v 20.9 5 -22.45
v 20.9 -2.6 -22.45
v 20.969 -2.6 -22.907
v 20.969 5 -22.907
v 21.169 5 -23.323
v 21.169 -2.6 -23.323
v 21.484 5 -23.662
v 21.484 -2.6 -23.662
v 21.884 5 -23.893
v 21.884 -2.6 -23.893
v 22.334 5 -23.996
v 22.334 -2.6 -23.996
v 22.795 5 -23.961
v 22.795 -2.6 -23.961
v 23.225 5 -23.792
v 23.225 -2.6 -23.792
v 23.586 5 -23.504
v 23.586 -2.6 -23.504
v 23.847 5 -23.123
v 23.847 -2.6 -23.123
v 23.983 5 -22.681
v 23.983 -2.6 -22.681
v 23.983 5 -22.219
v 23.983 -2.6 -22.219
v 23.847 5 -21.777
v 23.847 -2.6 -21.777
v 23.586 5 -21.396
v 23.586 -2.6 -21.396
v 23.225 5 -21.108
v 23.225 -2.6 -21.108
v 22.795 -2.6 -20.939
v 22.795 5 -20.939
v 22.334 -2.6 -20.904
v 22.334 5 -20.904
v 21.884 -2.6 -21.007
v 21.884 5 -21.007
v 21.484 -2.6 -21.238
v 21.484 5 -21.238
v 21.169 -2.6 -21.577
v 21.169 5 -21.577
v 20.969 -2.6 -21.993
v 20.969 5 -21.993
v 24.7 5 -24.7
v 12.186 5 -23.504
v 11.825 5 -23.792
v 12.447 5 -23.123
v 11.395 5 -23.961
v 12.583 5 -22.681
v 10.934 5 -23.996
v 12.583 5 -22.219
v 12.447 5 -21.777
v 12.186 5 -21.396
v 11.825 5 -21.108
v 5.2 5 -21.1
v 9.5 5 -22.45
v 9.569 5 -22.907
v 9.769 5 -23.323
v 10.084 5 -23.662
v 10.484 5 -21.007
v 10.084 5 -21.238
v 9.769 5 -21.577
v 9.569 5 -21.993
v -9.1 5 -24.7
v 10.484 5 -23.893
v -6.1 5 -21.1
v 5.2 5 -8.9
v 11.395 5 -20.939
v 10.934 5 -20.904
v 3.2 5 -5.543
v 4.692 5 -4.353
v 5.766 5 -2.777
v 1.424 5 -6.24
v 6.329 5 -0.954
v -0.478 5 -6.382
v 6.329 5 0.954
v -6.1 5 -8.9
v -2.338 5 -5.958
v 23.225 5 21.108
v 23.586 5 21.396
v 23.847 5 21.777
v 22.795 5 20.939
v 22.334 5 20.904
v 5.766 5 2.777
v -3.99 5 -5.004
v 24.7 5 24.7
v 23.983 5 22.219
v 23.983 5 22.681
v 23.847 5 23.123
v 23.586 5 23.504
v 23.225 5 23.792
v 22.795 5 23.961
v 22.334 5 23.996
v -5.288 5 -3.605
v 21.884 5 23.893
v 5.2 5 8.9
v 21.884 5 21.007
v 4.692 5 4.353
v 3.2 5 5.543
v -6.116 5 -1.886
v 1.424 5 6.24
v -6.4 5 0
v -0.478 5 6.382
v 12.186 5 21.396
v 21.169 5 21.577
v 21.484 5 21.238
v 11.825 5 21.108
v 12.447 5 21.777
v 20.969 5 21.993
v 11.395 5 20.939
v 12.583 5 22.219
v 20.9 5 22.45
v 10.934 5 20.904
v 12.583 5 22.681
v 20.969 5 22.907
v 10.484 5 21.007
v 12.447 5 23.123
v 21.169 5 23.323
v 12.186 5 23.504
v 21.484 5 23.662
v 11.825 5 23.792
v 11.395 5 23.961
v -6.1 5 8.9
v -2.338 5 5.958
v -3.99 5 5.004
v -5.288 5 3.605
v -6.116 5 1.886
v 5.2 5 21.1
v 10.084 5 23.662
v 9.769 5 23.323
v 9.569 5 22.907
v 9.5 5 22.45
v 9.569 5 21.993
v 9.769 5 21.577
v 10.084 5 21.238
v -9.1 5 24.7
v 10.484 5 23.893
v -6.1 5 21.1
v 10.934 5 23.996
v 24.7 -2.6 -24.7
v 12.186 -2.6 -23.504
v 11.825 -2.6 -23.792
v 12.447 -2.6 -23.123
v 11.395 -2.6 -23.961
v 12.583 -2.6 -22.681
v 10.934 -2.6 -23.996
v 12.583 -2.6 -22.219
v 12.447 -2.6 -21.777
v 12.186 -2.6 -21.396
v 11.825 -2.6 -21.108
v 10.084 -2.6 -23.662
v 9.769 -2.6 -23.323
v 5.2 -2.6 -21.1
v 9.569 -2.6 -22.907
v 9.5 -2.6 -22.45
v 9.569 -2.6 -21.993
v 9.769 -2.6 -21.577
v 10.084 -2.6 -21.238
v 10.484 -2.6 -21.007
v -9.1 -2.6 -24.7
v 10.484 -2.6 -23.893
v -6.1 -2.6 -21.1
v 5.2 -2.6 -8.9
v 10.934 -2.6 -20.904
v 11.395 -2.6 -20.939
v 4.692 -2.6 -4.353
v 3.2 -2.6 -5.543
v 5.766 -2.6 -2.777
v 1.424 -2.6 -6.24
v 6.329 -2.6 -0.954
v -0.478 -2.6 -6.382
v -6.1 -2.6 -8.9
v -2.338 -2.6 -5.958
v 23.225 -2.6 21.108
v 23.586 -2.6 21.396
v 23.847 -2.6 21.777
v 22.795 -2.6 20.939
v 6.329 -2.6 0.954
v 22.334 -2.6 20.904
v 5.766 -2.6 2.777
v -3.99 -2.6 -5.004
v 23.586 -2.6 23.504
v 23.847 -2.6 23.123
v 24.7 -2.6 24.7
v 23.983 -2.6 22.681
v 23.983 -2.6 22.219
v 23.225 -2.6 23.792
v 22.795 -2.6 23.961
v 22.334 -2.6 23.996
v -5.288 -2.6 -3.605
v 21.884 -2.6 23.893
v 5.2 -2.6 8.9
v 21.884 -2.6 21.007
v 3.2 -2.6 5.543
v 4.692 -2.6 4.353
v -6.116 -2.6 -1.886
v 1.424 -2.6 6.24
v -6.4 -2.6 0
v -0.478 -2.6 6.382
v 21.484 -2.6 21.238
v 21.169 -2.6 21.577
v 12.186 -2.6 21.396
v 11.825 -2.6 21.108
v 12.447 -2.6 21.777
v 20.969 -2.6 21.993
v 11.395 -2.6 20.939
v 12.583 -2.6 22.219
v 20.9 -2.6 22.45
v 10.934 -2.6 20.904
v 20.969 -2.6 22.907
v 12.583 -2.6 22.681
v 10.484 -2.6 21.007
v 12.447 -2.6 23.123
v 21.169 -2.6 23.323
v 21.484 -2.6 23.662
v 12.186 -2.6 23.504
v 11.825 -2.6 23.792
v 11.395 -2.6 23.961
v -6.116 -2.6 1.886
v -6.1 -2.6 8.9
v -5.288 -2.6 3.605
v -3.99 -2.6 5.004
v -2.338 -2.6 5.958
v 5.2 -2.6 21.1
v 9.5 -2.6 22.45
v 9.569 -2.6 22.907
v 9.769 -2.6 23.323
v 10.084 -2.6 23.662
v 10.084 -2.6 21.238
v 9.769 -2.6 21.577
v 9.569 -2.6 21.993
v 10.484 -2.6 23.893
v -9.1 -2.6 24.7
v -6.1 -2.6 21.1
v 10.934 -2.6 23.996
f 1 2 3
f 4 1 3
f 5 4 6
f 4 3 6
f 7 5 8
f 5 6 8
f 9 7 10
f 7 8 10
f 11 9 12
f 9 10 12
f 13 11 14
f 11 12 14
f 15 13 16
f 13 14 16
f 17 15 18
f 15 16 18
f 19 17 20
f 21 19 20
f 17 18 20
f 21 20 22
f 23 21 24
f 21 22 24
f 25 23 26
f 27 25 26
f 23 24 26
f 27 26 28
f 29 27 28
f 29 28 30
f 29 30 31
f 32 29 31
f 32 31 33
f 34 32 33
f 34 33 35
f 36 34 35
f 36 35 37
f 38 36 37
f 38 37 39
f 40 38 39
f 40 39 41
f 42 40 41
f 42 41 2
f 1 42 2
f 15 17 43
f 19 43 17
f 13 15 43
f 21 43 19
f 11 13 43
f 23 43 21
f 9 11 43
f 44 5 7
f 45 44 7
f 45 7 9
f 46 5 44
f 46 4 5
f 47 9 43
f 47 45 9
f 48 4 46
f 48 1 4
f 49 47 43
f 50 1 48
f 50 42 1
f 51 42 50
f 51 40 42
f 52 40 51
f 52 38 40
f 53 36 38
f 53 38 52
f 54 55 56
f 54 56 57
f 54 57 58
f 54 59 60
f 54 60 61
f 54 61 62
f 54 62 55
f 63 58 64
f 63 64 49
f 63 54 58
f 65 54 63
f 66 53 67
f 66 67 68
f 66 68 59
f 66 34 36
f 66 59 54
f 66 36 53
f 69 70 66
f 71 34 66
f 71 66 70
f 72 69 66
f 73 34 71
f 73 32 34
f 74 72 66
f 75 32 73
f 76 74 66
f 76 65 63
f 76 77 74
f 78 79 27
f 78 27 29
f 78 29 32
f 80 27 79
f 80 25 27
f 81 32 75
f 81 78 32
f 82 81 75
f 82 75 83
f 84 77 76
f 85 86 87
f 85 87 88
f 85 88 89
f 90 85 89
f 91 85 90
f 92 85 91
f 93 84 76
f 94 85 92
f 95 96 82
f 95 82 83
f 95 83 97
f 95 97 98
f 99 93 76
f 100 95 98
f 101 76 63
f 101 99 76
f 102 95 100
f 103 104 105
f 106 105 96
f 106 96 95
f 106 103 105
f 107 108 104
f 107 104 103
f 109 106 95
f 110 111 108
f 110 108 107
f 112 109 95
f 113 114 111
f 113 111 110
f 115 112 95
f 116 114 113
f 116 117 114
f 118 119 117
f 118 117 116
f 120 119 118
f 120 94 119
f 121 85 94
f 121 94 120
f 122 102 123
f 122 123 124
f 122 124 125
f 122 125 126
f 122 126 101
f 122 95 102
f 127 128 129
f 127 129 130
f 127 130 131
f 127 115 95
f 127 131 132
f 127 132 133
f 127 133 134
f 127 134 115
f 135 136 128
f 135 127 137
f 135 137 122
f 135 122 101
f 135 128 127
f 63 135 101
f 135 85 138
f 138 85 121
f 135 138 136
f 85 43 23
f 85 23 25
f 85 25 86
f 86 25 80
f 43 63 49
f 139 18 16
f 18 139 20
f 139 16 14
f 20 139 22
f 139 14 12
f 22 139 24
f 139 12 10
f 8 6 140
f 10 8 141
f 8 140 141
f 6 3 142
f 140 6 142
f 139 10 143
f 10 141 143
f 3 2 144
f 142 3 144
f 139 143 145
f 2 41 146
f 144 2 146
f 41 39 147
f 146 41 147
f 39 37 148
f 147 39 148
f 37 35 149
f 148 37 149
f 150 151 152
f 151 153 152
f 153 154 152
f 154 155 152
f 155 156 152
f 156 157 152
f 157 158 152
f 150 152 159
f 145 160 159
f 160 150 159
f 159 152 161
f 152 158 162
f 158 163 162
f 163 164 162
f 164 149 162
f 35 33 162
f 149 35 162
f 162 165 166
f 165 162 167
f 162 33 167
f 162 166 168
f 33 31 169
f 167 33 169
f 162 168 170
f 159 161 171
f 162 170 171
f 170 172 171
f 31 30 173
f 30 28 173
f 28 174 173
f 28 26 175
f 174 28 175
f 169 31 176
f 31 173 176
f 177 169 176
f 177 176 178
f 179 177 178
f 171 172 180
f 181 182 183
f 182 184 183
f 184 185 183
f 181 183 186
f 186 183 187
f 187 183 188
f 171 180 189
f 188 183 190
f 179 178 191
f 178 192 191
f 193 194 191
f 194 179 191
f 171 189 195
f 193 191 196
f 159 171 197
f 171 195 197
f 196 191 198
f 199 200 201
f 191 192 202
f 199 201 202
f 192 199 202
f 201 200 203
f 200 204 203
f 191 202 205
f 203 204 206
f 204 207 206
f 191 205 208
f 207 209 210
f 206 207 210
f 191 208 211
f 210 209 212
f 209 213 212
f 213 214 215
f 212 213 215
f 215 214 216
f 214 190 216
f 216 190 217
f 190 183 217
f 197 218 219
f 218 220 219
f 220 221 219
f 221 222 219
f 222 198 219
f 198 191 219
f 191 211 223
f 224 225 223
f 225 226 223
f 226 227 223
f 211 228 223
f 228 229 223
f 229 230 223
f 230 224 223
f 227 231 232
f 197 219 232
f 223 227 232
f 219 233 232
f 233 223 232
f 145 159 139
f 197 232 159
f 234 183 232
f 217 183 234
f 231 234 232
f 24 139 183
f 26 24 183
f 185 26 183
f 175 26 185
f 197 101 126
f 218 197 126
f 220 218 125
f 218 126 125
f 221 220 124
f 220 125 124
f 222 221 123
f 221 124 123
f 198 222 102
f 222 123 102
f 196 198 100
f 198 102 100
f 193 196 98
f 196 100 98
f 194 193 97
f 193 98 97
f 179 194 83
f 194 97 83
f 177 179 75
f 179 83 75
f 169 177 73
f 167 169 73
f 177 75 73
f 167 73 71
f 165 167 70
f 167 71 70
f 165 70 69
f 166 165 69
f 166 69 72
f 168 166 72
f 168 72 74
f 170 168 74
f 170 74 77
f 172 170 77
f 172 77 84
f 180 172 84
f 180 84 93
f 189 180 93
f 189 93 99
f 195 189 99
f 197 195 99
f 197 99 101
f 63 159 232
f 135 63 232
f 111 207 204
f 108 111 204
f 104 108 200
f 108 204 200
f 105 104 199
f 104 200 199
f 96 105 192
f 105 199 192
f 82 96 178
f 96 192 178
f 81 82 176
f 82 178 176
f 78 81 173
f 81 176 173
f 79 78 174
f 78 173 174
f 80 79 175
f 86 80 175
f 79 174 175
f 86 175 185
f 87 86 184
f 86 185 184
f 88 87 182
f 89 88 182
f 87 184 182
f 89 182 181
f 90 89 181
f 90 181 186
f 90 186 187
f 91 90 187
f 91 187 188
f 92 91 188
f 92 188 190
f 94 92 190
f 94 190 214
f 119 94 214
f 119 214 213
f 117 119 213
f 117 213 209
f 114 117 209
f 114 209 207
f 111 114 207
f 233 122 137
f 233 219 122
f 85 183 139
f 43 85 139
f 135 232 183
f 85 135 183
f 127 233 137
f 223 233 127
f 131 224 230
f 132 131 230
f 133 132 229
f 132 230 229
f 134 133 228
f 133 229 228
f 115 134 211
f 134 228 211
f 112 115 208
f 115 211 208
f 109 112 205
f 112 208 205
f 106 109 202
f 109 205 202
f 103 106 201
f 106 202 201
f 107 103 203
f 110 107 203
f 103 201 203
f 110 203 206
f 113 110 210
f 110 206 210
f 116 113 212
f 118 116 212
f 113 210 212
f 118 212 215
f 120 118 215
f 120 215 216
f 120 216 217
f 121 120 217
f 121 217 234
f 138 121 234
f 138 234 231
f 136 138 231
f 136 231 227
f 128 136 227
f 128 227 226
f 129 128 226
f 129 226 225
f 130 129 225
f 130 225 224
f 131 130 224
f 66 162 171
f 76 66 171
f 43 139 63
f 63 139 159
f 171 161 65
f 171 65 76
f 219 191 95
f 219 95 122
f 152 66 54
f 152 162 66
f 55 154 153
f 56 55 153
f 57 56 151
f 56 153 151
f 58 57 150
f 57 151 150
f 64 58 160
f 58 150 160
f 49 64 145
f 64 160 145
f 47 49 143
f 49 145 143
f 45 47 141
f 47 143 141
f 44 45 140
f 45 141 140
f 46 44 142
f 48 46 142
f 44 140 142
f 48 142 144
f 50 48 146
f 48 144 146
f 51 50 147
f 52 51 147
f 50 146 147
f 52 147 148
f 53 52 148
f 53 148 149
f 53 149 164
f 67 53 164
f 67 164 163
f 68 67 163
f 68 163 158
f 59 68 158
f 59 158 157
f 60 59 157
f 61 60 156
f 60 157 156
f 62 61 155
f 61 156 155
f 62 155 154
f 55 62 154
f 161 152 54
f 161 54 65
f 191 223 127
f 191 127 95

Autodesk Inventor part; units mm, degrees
ref_plane "YZ Plane" through (0, 0, 0) normal (1, 0, 0) x (0, 1, 0)
ref_plane "XZ Plane" through (0, 0, 0) normal (0, 1, 0) x (-1, 0, 0)
ref_plane "XY Plane" through (0, 0, 0) normal (0, 0, 1) x (1, 0, 0)
sketch "Esboço1" plane through (0, 0, 0) normal (0, 1, 0) x (-1, 0, 0)
  circle A0 centre (0, 0) radius 2.1
  line L0 (0, 0) -> (0, 15)
  circle A1 centre (0, 15) radius 2
  line L1 (0, 0) -> (0, -15)
  circle A2 centre (0, -15) radius 2.1
  line L2 (0, 15) -> (-5.2, 15)
  line L3 (-5.2, 15) -> (-5.2, -15)
  line L4 (-5.2, -15) -> (0, -15)
  circle A3 centre (0, 0) radius 6.1
  circle A4 centre (0, 0) radius 24.7
  line L5 (0, 24.7) -> (24.7, 24.7)
  line L6 (24.7, 24.7) -> (24.7, 0)
  line L7 (24.7, 0) -> (0, 0)
  line L8 (0, 0) -> (0, 24.7)
  line L9 (24.7, 0) -> (0, 0)
  line L10 (0, 0) -> (0, -24.7)
  line L11 (0, -24.7) -> (24.7, -24.7)
  line L12 (24.7, -24.7) -> (24.7, 0)
  line L13 (0, -24.7) -> (-24.7, -24.7)
  line L14 (-24.7, -24.7) -> (-24.7, 0)
  line L15 (-24.7, 0) -> (0, 0)
  line L16 (0, 0) -> (0, -24.7)
  line L17 (0, 24.7) -> (-24.7, 24.7)
  line L18 (-24.7, 24.7) -> (-24.7, 0)
  line L19 (-24.7, 0) -> (0, 0)
  line L20 (0, 0) -> (0, 24.7)
  line L21 (-5.2, 15) -> (-5.2, 24.7)
  line L22 (-5.2, -15) -> (-5.2, -24.7)
  line L23 (-5.2, 24.7) -> (-24.7, 24.7)
  line L24 (-24.7, 24.7) -> (-24.7, -24.7)
  line L25 (-24.7, -24.7) -> (-5.2, -24.7)
  line L26 (-5.2, -24.7) -> (-5.2, 24.7)
  line L27 (0, -15) -> (0, -21.1)
  line L28 (0, -21.1) -> (-5.2, -21.1)
  line L29 (0, -15) -> (0, -8.9)
  line L30 (0, -8.9) -> (-5.2, -8.9)
  line L31 (0, -8.9) -> (0, -15)
  line L32 (0, 15) -> (0, 8.9)
  line L33 (0, 15) -> (0, 21.1)
  line L34 (0, 21.1) -> (-5.2, 21.1)
  line L35 (0, 8.9) -> (-5.2, 8.9)
  line L36 (6.1, 0) -> (6.1, -24.7)
  line L37 (6.1, 0) -> (6.1, 24.7)
  line L38 (-5.2, 21.1) -> (6.1, 21.1)
  line L39 (6.1, 21.1) -> (6.1, 24.7)
  line L40 (6.1, 24.7) -> (-5.2, 24.7)
  line L41 (-5.2, 24.7) -> (-5.2, 21.1)
  line L42 (-5.2, -21.1) -> (6.1, -21.1)
  line L43 (6.1, -21.1) -> (6.1, -24.7)
  line L44 (6.1, -24.7) -> (-5.2, -24.7)
  line L45 (-5.2, -24.7) -> (-5.2, -21.1)
  line L46 (6.1, 21.1) -> (0, 21.1)
  line L47 (0, 21.1) -> (0, 8.9)
  line L48 (0, 8.9) -> (6.1, 8.9)
  line L49 (6.1, 8.9) -> (6.1, 21.1)
  line L50 (0, -8.9) -> (6.1, -8.9)
  line L51 (6.1, -8.9) -> (6.1, -21.1)
  line L52 (6.1, -21.1) -> (0, -21.1)
  line L53 (0, -21.1) -> (0, -8.9)
  line L54 (6.1, -24.7) -> (9.1, -24.7)
  line L55 (9.1, -24.7) -> (9.1, 24.7)
  line L56 (9.1, 24.7) -> (6.1, 24.7)
  line L57 (6.1, 24.7) -> (6.1, -24.7)
  circle A5 centre (0, 0) radius 8.3
  circle A6 centre (0, 15) radius 8.3
  line L58 (-5.2, -8.9) -> (-24.7, -8.9)
  line L59 (-24.7, -8.9) -> (-24.7, -24.7)
  line L60 (-24.7, -24.7) -> (-5.2, -24.7)
  line L61 (-5.2, -24.7) -> (-5.2, -8.9)
  line L62 (-5.2, 8.9) -> (-24.7, 8.9)
  line L63 (-24.7, 8.9) -> (-24.7, 24.7)
  line L64 (-24.7, 24.7) -> (-5.2, 24.7)
  line L65 (-5.2, 24.7) -> (-5.2, 8.9)
  line L66 (-8.3, 0) -> (-8.3, -8.9)
  line L67 (-8.3, 0) -> (-8.3, 8.9)
  line L68 (-8.3, -8.9) -> (-8.8, -8.9)
  line L69 (-8.8, -8.9) -> (-8.8, 8.9)
  line L70 (-8.8, 8.9) -> (-8.3, 8.9)
  line L71 (-8.3, 8.9) -> (-8.3, -8.9)
  line L72 (-8.8, -8.9) -> (-24.7, -8.9)
  line L73 (-24.7, -8.9) -> (-24.7, -24.7)
  line L74 (-24.7, -24.7) -> (-8.8, -24.7)
  line L75 (-8.8, -24.7) -> (-8.8, -8.9)
  line L76 (-8.8, -8.9) -> (-24.7, -8.9)
  line L77 (-24.7, -8.9) -> (-24.7, 24.7)
  line L78 (-24.7, 24.7) -> (-8.8, 24.7)
  line L79 (-8.8, 24.7) -> (-8.8, -8.9)
  line L80 (9.1, -24.7) -> (6.1, -24.7)
  line L81 (6.1, -24.7) -> (6.1, -21.1)
  line L82 (6.1, -21.1) -> (9.1, -21.1)
  line L83 (9.1, -21.1) -> (9.1, -24.7)
  line L84 (6.1, 21.1) -> (9.1, 21.1)
  line L85 (9.1, 21.1) -> (9.1, 24.7)
  line L86 (9.1, 24.7) -> (6.1, 24.7)
  line L87 (6.1, 24.7) -> (6.1, 21.1)
  line L88 (9.1, 24.7) -> (9.1, 22.9)
  line L89 (-24.7, -24.7) -> (-21.7, -24.7)
  line L90 (-24.7, -21.1) -> (-24.7, -24.7)
  line L91 (-24.7, 24.7) -> (-21.7, 24.7)
  line L92 (-24.7, 21.1) -> (-24.7, 24.7)
  line L93 (-24.7, -24.7) -> (-20.2, -24.7)
  line L94 (-20.2, -24.7) -> (-20.2, -20.2)
  line L95 (-20.2, -20.2) -> (-24.7, -20.2)
  line L96 (-24.7, -20.2) -> (-24.7, -24.7)
  line L97 (-24.7, 24.7) -> (-20.2, 24.7)
  line L98 (-20.2, 24.7) -> (-20.2, 20.2)
  line L99 (-20.2, 20.2) -> (-24.7, 20.2)
  line L100 (-24.7, 20.2) -> (-24.7, 24.7)
  line L101 (-8.8, -24.7) -> (-13.3, -24.7)
  line L102 (-13.3, -24.7) -> (-13.3, -20.2)
  line L103 (-13.3, -20.2) -> (-8.8, -20.2)
  line L104 (-8.8, -20.2) -> (-8.8, -24.7)
  line L105 (-8.8, 24.7) -> (-13.3, 24.7)
  line L106 (-13.3, 24.7) -> (-13.3, 20.2)
  line L107 (-13.3, 20.2) -> (-8.8, 20.2)
  line L108 (-8.8, 20.2) -> (-8.8, 24.7)
  line L109 (-13.3, -22.45) -> (-8.8, -22.45)
  line L110 (-20.2, -22.45) -> (-24.7, -22.45)
  line L111 (-20.2, 22.45) -> (-24.7, 22.45)
  line L112 (-8.8, 22.45) -> (-13.3, 22.45)
  circle A7 centre (-11.05, -22.45) radius 1.55
  circle A8 centre (-22.45, -22.45) radius 1.55
  circle A9 centre (-11.05, 22.45) radius 1.55
  circle A10 centre (-22.45, 22.45) radius 1.55
  circle A11 centre (0, 0) radius 6.4
  point P0 (-5.2, -3.189)
  point P1 (-5.2, 3.189)
  point P2 (-5.2, 24.1464)
  point P3 (-5.2, -24.1464)
  point P4 (6.1, -21.1)
  point P5 (6.1, 21.1)
  dimension "d6" = 12.2
  dimension "d19" = 16.6
  dimension "d0" = 4.2
  dimension "d1" = 15
  dimension "d2" = 4
  dimension "d3" = 15
  dimension "d4" = 4.2
  dimension "d5" = 5.2
  dimension "d7" = 49.4
  dimension "d8" = 6.1
  dimension "d9" = 6.1
  dimension "d10" = 6.1
  dimension "d11" = 6.1
  dimension "d16" = 3
  dimension "d20" = 16.6
  dimension "d21" = 0.5
  dimension "d29" = 4.5
  dimension "d30" = 4.5
  dimension "d31" = 4.5
  dimension "d32" = 4.5
  dimension "d33" = 4.5
  dimension "d34" = 4.5
  dimension "d35" = 4.5
  dimension "d36" = 4.5
  dimension "d37" = 3.1
  dimension "d38" = 3.1
  dimension "d39" = 3.1
  dimension "d40" = 3.1
  dimension "d45" = 12.8
extrude "Extrusão1" add sketch "Esboço1" along normal blind 5 contours A3 L15 A11 L3 | L3 A11 L15 A3 | A11 L15 A5 L3 | L3 A5 L15 A11 | A5 L67 L62 A6 L3 | L3 L58 L66 A5 | L66 L58 L69 L15 | L15 L69 L62 L67 | A6 L62 L3 | L3 L22 A4 L75 L58 | L69 L58 A4 L15 | L15 A4 L62 L69 | L62 L79 A4 L21 A6 | L62 A6 L21 L3 | L75 L103 L102 A4 L58 | L62 A4 L106 L107 L79 | L75 L109 A7 A4 L102 L103 | L107 L106 A4 A9 L112 L79 | A4 A7 L109 L75 | L112 A9 A4 L79 | A4 L109 A7 | A4 L112 A9 | A7 L109 A4 | L112 A4 A9 picked at (-9.9489, -22.4881) picked at (-11.1489, 21.6171) picked at (-11.1489, -21.6171) picked at (-9.9489, 22.4881)
extrude "Extrusão2" add sketch "Esboço1" along normal blind 5 contours L36 A11 L1 A3 | A3 L0 A11 L37 | A3 L3 A11 L0 | L1 A11 L3 A3 | L36 A5 L1 A11 | A11 L0 A6 A5 L37 | A11 L3 A5 A6 L0 | L1 A5 L3 A11 | L36 L50 L1 A5 | A5 A6 L48 L37 | A6 A5 L0 | L0 A5 A6 | L1 L30 L3 A5 | A5 L0 L48 A6 | A5 A6 L3 L35 L0 | A5 L3 A6 | L36 A4 L10 L42 | L38 A6 L8 A4 L37 | L36 L11 A4 | L10 A4 L22 L28 | A4 L5 L37 | L38 L8 A6 | L13 L22 A4 | L18 L62 A4 | A4 L58 L14 | A6 L8 L34 L21 | L21 A4 L8 A6 | A4 L21 L17 | L22 L13 L75 A4 | L62 L18 L99 L98 L17 L106 A4 | A4 L102 L13 L94 L95 L14 L58 | A4 L79 L17 L21 | L75 L13 L102 L109 A7 A4 | L106 L112 A9 A4 | A4 A7 L109 L102 | L95 L94 L110 A8 L14 | L18 L111 A10 L98 L99 | A4 A9 L112 L106 L17 L79 | A7 L109 A4 | A9 L112 A4 | A4 L109 A7 | A4 L112 A9 | L13 L14 L110 A8 L94 | L18 L17 L98 L111 A10 | A8 L110 | L110 A8 | A10 L111 | L111 A10 picked at (-11.818, -22.5746) picked at (-11.7193, 22.131) picked at (-11.7193, -22.131) picked at (-11.818, 22.5746)
extrude "Extrusão3" add sketch "Esboço1" along normal blind 5 contours L37 A11 L7 | L7 A11 L36 | A11 L37 A5 L7 | L7 A5 L36 A11 | A5 L37 A6 L84 L55 L7 | L7 L55 L82 L36 A5 | L55 A4 L36 L82 | L84 L37 A4 L55 | L37 A6 | A4 L37 L5 L55 | L55 L11 L36 A4
extrude "Extrusão4" cut sketch "Esboço1" along normal through all contours A7 L109 A4 | A4 L109 A7 | A9 L112 A4 | A4 L112 A9 | A7 L109 A4 | A4 L109 A7 | L112 A4 A9 | A4 L112 A9 | A8 L110 | L110 A8 | A10 L111 | L111 A10
extrude "Extrusão5" add sketch "Esboço1" against normal blind 2.6 contours L36 A11 L1 A3 | L37 A11 L7 | L7 A11 L36 | A3 L0 A11 L37 | A3 L3 A11 L0 | L1 A11 L3 A3 | A11 L37 A5 L7 | L7 A5 L36 A11 | L36 A5 L1 A11 | A11 L0 A6 A5 L37 | A11 L3 A5 A6 L0 | A3 L15 A11 L3 | L1 A5 L3 A11 | L3 A11 L15 A3 | A5 L37 A6 L84 L55 L7 | L7 L55 L82 L36 A5 | L36 L50 L1 A5 | A5 A6 L48 L37 | A6 A5 L0 | L0 A5 A6 | A11 L15 A5 L3 | L1 L30 L3 A5 | L3 A5 L15 A11 | A5 L0 L48 A6 | A5 A6 L3 L35 L0 | A5 L3 A6 | A5 L67 L62 A6 L3 | L3 L58 L66 A5 | L55 A4 L36 L82 | L84 L37 A4 L55 | L36 A4 L10 L42 | L37 A6 | L66 L58 L69 L15 | L15 L69 L62 L67 | A6 L62 L3 | L3 L22 A4 L75 L58 | A4 L37 L5 L55 | L55 L11 L36 A4 | L38 A6 L8 A4 L37 | L36 L11 A4 | L10 A4 L22 L28 | L69 L58 A4 L15 | L15 A4 L62 L69 | L62 L79 A4 L21 A6 | L62 A6 L21 L3 | A4 L5 L37 | L38 L8 A6 | L13 L22 A4 | L18 L62 A4 | A4 L58 L14 | L75 L103 L102 A4 L58 | L62 A4 L106 L107 L79 | A6 L8 L34 L21 | L21 A4 L8 A6 | A4 L21 L17 | L22 L13 L75 A4 | L62 L18 L99 L98 L17 L106 A4 | A4 L102 L13 L94 L95 L14 L58 | L75 L109 A7 A4 L102 L103 | L107 L106 A4 A9 L112 L79 | A4 L79 L17 L21 | L75 L13 L102 L109 A7 A4 | A4 A7 L109 L75 | L106 L112 A9 A4 | A4 A7 L109 L102 | L95 L94 L110 A8 L14 | L18 L111 A10 L98 L99 | L112 A9 A4 L79 | A4 A9 L112 L106 L17 L79 | L13 L14 L110 A8 L94 | L18 L17 L98 L111 A10
extrude "Extrusão6" cut sketch "Esboço1" against normal blind 2.6 contours L7 L0 A0 | L7 A3 L1 A0 | A0 L0 A3 L7 | A0 L1 L7 | L0 L15 A0 | A0 L15 L3 A3 L0 | L1 A3 L3 L15 A0 | A0 L15 L1 | L36 A11 L1 A3 | L37 A11 L7 | L7 A11 L36 | A3 L0 A11 L37 | A3 L3 A11 L0 | L1 A11 L3 A3 | L15 A3 L3 | L3 A3 L15 | A3 L15 A11 L3 | L3 A11 L15 A3
extrude "Extrusão7" cut sketch "Esboço1" along normal through all contours L7 L0 A0 | L7 A3 L1 A0 | A0 L0 A3 L7 | A0 L1 L7 | L0 L15 A0 | A0 L15 L3 A3 L0 | L1 A3 L3 L15 A0 | A0 L15 L1 | L36 A11 L1 A3 | L37 A11 L7 | L7 A11 L36 | A3 L0 A11 L37 | A3 L3 A11 L0 | L1 A11 L3 A3 | L15 A3 L3 | L3 A3 L15 | A3 L15 A11 L3 | L3 A11 L15 A3
properties part number "peça1_3DPrint"
